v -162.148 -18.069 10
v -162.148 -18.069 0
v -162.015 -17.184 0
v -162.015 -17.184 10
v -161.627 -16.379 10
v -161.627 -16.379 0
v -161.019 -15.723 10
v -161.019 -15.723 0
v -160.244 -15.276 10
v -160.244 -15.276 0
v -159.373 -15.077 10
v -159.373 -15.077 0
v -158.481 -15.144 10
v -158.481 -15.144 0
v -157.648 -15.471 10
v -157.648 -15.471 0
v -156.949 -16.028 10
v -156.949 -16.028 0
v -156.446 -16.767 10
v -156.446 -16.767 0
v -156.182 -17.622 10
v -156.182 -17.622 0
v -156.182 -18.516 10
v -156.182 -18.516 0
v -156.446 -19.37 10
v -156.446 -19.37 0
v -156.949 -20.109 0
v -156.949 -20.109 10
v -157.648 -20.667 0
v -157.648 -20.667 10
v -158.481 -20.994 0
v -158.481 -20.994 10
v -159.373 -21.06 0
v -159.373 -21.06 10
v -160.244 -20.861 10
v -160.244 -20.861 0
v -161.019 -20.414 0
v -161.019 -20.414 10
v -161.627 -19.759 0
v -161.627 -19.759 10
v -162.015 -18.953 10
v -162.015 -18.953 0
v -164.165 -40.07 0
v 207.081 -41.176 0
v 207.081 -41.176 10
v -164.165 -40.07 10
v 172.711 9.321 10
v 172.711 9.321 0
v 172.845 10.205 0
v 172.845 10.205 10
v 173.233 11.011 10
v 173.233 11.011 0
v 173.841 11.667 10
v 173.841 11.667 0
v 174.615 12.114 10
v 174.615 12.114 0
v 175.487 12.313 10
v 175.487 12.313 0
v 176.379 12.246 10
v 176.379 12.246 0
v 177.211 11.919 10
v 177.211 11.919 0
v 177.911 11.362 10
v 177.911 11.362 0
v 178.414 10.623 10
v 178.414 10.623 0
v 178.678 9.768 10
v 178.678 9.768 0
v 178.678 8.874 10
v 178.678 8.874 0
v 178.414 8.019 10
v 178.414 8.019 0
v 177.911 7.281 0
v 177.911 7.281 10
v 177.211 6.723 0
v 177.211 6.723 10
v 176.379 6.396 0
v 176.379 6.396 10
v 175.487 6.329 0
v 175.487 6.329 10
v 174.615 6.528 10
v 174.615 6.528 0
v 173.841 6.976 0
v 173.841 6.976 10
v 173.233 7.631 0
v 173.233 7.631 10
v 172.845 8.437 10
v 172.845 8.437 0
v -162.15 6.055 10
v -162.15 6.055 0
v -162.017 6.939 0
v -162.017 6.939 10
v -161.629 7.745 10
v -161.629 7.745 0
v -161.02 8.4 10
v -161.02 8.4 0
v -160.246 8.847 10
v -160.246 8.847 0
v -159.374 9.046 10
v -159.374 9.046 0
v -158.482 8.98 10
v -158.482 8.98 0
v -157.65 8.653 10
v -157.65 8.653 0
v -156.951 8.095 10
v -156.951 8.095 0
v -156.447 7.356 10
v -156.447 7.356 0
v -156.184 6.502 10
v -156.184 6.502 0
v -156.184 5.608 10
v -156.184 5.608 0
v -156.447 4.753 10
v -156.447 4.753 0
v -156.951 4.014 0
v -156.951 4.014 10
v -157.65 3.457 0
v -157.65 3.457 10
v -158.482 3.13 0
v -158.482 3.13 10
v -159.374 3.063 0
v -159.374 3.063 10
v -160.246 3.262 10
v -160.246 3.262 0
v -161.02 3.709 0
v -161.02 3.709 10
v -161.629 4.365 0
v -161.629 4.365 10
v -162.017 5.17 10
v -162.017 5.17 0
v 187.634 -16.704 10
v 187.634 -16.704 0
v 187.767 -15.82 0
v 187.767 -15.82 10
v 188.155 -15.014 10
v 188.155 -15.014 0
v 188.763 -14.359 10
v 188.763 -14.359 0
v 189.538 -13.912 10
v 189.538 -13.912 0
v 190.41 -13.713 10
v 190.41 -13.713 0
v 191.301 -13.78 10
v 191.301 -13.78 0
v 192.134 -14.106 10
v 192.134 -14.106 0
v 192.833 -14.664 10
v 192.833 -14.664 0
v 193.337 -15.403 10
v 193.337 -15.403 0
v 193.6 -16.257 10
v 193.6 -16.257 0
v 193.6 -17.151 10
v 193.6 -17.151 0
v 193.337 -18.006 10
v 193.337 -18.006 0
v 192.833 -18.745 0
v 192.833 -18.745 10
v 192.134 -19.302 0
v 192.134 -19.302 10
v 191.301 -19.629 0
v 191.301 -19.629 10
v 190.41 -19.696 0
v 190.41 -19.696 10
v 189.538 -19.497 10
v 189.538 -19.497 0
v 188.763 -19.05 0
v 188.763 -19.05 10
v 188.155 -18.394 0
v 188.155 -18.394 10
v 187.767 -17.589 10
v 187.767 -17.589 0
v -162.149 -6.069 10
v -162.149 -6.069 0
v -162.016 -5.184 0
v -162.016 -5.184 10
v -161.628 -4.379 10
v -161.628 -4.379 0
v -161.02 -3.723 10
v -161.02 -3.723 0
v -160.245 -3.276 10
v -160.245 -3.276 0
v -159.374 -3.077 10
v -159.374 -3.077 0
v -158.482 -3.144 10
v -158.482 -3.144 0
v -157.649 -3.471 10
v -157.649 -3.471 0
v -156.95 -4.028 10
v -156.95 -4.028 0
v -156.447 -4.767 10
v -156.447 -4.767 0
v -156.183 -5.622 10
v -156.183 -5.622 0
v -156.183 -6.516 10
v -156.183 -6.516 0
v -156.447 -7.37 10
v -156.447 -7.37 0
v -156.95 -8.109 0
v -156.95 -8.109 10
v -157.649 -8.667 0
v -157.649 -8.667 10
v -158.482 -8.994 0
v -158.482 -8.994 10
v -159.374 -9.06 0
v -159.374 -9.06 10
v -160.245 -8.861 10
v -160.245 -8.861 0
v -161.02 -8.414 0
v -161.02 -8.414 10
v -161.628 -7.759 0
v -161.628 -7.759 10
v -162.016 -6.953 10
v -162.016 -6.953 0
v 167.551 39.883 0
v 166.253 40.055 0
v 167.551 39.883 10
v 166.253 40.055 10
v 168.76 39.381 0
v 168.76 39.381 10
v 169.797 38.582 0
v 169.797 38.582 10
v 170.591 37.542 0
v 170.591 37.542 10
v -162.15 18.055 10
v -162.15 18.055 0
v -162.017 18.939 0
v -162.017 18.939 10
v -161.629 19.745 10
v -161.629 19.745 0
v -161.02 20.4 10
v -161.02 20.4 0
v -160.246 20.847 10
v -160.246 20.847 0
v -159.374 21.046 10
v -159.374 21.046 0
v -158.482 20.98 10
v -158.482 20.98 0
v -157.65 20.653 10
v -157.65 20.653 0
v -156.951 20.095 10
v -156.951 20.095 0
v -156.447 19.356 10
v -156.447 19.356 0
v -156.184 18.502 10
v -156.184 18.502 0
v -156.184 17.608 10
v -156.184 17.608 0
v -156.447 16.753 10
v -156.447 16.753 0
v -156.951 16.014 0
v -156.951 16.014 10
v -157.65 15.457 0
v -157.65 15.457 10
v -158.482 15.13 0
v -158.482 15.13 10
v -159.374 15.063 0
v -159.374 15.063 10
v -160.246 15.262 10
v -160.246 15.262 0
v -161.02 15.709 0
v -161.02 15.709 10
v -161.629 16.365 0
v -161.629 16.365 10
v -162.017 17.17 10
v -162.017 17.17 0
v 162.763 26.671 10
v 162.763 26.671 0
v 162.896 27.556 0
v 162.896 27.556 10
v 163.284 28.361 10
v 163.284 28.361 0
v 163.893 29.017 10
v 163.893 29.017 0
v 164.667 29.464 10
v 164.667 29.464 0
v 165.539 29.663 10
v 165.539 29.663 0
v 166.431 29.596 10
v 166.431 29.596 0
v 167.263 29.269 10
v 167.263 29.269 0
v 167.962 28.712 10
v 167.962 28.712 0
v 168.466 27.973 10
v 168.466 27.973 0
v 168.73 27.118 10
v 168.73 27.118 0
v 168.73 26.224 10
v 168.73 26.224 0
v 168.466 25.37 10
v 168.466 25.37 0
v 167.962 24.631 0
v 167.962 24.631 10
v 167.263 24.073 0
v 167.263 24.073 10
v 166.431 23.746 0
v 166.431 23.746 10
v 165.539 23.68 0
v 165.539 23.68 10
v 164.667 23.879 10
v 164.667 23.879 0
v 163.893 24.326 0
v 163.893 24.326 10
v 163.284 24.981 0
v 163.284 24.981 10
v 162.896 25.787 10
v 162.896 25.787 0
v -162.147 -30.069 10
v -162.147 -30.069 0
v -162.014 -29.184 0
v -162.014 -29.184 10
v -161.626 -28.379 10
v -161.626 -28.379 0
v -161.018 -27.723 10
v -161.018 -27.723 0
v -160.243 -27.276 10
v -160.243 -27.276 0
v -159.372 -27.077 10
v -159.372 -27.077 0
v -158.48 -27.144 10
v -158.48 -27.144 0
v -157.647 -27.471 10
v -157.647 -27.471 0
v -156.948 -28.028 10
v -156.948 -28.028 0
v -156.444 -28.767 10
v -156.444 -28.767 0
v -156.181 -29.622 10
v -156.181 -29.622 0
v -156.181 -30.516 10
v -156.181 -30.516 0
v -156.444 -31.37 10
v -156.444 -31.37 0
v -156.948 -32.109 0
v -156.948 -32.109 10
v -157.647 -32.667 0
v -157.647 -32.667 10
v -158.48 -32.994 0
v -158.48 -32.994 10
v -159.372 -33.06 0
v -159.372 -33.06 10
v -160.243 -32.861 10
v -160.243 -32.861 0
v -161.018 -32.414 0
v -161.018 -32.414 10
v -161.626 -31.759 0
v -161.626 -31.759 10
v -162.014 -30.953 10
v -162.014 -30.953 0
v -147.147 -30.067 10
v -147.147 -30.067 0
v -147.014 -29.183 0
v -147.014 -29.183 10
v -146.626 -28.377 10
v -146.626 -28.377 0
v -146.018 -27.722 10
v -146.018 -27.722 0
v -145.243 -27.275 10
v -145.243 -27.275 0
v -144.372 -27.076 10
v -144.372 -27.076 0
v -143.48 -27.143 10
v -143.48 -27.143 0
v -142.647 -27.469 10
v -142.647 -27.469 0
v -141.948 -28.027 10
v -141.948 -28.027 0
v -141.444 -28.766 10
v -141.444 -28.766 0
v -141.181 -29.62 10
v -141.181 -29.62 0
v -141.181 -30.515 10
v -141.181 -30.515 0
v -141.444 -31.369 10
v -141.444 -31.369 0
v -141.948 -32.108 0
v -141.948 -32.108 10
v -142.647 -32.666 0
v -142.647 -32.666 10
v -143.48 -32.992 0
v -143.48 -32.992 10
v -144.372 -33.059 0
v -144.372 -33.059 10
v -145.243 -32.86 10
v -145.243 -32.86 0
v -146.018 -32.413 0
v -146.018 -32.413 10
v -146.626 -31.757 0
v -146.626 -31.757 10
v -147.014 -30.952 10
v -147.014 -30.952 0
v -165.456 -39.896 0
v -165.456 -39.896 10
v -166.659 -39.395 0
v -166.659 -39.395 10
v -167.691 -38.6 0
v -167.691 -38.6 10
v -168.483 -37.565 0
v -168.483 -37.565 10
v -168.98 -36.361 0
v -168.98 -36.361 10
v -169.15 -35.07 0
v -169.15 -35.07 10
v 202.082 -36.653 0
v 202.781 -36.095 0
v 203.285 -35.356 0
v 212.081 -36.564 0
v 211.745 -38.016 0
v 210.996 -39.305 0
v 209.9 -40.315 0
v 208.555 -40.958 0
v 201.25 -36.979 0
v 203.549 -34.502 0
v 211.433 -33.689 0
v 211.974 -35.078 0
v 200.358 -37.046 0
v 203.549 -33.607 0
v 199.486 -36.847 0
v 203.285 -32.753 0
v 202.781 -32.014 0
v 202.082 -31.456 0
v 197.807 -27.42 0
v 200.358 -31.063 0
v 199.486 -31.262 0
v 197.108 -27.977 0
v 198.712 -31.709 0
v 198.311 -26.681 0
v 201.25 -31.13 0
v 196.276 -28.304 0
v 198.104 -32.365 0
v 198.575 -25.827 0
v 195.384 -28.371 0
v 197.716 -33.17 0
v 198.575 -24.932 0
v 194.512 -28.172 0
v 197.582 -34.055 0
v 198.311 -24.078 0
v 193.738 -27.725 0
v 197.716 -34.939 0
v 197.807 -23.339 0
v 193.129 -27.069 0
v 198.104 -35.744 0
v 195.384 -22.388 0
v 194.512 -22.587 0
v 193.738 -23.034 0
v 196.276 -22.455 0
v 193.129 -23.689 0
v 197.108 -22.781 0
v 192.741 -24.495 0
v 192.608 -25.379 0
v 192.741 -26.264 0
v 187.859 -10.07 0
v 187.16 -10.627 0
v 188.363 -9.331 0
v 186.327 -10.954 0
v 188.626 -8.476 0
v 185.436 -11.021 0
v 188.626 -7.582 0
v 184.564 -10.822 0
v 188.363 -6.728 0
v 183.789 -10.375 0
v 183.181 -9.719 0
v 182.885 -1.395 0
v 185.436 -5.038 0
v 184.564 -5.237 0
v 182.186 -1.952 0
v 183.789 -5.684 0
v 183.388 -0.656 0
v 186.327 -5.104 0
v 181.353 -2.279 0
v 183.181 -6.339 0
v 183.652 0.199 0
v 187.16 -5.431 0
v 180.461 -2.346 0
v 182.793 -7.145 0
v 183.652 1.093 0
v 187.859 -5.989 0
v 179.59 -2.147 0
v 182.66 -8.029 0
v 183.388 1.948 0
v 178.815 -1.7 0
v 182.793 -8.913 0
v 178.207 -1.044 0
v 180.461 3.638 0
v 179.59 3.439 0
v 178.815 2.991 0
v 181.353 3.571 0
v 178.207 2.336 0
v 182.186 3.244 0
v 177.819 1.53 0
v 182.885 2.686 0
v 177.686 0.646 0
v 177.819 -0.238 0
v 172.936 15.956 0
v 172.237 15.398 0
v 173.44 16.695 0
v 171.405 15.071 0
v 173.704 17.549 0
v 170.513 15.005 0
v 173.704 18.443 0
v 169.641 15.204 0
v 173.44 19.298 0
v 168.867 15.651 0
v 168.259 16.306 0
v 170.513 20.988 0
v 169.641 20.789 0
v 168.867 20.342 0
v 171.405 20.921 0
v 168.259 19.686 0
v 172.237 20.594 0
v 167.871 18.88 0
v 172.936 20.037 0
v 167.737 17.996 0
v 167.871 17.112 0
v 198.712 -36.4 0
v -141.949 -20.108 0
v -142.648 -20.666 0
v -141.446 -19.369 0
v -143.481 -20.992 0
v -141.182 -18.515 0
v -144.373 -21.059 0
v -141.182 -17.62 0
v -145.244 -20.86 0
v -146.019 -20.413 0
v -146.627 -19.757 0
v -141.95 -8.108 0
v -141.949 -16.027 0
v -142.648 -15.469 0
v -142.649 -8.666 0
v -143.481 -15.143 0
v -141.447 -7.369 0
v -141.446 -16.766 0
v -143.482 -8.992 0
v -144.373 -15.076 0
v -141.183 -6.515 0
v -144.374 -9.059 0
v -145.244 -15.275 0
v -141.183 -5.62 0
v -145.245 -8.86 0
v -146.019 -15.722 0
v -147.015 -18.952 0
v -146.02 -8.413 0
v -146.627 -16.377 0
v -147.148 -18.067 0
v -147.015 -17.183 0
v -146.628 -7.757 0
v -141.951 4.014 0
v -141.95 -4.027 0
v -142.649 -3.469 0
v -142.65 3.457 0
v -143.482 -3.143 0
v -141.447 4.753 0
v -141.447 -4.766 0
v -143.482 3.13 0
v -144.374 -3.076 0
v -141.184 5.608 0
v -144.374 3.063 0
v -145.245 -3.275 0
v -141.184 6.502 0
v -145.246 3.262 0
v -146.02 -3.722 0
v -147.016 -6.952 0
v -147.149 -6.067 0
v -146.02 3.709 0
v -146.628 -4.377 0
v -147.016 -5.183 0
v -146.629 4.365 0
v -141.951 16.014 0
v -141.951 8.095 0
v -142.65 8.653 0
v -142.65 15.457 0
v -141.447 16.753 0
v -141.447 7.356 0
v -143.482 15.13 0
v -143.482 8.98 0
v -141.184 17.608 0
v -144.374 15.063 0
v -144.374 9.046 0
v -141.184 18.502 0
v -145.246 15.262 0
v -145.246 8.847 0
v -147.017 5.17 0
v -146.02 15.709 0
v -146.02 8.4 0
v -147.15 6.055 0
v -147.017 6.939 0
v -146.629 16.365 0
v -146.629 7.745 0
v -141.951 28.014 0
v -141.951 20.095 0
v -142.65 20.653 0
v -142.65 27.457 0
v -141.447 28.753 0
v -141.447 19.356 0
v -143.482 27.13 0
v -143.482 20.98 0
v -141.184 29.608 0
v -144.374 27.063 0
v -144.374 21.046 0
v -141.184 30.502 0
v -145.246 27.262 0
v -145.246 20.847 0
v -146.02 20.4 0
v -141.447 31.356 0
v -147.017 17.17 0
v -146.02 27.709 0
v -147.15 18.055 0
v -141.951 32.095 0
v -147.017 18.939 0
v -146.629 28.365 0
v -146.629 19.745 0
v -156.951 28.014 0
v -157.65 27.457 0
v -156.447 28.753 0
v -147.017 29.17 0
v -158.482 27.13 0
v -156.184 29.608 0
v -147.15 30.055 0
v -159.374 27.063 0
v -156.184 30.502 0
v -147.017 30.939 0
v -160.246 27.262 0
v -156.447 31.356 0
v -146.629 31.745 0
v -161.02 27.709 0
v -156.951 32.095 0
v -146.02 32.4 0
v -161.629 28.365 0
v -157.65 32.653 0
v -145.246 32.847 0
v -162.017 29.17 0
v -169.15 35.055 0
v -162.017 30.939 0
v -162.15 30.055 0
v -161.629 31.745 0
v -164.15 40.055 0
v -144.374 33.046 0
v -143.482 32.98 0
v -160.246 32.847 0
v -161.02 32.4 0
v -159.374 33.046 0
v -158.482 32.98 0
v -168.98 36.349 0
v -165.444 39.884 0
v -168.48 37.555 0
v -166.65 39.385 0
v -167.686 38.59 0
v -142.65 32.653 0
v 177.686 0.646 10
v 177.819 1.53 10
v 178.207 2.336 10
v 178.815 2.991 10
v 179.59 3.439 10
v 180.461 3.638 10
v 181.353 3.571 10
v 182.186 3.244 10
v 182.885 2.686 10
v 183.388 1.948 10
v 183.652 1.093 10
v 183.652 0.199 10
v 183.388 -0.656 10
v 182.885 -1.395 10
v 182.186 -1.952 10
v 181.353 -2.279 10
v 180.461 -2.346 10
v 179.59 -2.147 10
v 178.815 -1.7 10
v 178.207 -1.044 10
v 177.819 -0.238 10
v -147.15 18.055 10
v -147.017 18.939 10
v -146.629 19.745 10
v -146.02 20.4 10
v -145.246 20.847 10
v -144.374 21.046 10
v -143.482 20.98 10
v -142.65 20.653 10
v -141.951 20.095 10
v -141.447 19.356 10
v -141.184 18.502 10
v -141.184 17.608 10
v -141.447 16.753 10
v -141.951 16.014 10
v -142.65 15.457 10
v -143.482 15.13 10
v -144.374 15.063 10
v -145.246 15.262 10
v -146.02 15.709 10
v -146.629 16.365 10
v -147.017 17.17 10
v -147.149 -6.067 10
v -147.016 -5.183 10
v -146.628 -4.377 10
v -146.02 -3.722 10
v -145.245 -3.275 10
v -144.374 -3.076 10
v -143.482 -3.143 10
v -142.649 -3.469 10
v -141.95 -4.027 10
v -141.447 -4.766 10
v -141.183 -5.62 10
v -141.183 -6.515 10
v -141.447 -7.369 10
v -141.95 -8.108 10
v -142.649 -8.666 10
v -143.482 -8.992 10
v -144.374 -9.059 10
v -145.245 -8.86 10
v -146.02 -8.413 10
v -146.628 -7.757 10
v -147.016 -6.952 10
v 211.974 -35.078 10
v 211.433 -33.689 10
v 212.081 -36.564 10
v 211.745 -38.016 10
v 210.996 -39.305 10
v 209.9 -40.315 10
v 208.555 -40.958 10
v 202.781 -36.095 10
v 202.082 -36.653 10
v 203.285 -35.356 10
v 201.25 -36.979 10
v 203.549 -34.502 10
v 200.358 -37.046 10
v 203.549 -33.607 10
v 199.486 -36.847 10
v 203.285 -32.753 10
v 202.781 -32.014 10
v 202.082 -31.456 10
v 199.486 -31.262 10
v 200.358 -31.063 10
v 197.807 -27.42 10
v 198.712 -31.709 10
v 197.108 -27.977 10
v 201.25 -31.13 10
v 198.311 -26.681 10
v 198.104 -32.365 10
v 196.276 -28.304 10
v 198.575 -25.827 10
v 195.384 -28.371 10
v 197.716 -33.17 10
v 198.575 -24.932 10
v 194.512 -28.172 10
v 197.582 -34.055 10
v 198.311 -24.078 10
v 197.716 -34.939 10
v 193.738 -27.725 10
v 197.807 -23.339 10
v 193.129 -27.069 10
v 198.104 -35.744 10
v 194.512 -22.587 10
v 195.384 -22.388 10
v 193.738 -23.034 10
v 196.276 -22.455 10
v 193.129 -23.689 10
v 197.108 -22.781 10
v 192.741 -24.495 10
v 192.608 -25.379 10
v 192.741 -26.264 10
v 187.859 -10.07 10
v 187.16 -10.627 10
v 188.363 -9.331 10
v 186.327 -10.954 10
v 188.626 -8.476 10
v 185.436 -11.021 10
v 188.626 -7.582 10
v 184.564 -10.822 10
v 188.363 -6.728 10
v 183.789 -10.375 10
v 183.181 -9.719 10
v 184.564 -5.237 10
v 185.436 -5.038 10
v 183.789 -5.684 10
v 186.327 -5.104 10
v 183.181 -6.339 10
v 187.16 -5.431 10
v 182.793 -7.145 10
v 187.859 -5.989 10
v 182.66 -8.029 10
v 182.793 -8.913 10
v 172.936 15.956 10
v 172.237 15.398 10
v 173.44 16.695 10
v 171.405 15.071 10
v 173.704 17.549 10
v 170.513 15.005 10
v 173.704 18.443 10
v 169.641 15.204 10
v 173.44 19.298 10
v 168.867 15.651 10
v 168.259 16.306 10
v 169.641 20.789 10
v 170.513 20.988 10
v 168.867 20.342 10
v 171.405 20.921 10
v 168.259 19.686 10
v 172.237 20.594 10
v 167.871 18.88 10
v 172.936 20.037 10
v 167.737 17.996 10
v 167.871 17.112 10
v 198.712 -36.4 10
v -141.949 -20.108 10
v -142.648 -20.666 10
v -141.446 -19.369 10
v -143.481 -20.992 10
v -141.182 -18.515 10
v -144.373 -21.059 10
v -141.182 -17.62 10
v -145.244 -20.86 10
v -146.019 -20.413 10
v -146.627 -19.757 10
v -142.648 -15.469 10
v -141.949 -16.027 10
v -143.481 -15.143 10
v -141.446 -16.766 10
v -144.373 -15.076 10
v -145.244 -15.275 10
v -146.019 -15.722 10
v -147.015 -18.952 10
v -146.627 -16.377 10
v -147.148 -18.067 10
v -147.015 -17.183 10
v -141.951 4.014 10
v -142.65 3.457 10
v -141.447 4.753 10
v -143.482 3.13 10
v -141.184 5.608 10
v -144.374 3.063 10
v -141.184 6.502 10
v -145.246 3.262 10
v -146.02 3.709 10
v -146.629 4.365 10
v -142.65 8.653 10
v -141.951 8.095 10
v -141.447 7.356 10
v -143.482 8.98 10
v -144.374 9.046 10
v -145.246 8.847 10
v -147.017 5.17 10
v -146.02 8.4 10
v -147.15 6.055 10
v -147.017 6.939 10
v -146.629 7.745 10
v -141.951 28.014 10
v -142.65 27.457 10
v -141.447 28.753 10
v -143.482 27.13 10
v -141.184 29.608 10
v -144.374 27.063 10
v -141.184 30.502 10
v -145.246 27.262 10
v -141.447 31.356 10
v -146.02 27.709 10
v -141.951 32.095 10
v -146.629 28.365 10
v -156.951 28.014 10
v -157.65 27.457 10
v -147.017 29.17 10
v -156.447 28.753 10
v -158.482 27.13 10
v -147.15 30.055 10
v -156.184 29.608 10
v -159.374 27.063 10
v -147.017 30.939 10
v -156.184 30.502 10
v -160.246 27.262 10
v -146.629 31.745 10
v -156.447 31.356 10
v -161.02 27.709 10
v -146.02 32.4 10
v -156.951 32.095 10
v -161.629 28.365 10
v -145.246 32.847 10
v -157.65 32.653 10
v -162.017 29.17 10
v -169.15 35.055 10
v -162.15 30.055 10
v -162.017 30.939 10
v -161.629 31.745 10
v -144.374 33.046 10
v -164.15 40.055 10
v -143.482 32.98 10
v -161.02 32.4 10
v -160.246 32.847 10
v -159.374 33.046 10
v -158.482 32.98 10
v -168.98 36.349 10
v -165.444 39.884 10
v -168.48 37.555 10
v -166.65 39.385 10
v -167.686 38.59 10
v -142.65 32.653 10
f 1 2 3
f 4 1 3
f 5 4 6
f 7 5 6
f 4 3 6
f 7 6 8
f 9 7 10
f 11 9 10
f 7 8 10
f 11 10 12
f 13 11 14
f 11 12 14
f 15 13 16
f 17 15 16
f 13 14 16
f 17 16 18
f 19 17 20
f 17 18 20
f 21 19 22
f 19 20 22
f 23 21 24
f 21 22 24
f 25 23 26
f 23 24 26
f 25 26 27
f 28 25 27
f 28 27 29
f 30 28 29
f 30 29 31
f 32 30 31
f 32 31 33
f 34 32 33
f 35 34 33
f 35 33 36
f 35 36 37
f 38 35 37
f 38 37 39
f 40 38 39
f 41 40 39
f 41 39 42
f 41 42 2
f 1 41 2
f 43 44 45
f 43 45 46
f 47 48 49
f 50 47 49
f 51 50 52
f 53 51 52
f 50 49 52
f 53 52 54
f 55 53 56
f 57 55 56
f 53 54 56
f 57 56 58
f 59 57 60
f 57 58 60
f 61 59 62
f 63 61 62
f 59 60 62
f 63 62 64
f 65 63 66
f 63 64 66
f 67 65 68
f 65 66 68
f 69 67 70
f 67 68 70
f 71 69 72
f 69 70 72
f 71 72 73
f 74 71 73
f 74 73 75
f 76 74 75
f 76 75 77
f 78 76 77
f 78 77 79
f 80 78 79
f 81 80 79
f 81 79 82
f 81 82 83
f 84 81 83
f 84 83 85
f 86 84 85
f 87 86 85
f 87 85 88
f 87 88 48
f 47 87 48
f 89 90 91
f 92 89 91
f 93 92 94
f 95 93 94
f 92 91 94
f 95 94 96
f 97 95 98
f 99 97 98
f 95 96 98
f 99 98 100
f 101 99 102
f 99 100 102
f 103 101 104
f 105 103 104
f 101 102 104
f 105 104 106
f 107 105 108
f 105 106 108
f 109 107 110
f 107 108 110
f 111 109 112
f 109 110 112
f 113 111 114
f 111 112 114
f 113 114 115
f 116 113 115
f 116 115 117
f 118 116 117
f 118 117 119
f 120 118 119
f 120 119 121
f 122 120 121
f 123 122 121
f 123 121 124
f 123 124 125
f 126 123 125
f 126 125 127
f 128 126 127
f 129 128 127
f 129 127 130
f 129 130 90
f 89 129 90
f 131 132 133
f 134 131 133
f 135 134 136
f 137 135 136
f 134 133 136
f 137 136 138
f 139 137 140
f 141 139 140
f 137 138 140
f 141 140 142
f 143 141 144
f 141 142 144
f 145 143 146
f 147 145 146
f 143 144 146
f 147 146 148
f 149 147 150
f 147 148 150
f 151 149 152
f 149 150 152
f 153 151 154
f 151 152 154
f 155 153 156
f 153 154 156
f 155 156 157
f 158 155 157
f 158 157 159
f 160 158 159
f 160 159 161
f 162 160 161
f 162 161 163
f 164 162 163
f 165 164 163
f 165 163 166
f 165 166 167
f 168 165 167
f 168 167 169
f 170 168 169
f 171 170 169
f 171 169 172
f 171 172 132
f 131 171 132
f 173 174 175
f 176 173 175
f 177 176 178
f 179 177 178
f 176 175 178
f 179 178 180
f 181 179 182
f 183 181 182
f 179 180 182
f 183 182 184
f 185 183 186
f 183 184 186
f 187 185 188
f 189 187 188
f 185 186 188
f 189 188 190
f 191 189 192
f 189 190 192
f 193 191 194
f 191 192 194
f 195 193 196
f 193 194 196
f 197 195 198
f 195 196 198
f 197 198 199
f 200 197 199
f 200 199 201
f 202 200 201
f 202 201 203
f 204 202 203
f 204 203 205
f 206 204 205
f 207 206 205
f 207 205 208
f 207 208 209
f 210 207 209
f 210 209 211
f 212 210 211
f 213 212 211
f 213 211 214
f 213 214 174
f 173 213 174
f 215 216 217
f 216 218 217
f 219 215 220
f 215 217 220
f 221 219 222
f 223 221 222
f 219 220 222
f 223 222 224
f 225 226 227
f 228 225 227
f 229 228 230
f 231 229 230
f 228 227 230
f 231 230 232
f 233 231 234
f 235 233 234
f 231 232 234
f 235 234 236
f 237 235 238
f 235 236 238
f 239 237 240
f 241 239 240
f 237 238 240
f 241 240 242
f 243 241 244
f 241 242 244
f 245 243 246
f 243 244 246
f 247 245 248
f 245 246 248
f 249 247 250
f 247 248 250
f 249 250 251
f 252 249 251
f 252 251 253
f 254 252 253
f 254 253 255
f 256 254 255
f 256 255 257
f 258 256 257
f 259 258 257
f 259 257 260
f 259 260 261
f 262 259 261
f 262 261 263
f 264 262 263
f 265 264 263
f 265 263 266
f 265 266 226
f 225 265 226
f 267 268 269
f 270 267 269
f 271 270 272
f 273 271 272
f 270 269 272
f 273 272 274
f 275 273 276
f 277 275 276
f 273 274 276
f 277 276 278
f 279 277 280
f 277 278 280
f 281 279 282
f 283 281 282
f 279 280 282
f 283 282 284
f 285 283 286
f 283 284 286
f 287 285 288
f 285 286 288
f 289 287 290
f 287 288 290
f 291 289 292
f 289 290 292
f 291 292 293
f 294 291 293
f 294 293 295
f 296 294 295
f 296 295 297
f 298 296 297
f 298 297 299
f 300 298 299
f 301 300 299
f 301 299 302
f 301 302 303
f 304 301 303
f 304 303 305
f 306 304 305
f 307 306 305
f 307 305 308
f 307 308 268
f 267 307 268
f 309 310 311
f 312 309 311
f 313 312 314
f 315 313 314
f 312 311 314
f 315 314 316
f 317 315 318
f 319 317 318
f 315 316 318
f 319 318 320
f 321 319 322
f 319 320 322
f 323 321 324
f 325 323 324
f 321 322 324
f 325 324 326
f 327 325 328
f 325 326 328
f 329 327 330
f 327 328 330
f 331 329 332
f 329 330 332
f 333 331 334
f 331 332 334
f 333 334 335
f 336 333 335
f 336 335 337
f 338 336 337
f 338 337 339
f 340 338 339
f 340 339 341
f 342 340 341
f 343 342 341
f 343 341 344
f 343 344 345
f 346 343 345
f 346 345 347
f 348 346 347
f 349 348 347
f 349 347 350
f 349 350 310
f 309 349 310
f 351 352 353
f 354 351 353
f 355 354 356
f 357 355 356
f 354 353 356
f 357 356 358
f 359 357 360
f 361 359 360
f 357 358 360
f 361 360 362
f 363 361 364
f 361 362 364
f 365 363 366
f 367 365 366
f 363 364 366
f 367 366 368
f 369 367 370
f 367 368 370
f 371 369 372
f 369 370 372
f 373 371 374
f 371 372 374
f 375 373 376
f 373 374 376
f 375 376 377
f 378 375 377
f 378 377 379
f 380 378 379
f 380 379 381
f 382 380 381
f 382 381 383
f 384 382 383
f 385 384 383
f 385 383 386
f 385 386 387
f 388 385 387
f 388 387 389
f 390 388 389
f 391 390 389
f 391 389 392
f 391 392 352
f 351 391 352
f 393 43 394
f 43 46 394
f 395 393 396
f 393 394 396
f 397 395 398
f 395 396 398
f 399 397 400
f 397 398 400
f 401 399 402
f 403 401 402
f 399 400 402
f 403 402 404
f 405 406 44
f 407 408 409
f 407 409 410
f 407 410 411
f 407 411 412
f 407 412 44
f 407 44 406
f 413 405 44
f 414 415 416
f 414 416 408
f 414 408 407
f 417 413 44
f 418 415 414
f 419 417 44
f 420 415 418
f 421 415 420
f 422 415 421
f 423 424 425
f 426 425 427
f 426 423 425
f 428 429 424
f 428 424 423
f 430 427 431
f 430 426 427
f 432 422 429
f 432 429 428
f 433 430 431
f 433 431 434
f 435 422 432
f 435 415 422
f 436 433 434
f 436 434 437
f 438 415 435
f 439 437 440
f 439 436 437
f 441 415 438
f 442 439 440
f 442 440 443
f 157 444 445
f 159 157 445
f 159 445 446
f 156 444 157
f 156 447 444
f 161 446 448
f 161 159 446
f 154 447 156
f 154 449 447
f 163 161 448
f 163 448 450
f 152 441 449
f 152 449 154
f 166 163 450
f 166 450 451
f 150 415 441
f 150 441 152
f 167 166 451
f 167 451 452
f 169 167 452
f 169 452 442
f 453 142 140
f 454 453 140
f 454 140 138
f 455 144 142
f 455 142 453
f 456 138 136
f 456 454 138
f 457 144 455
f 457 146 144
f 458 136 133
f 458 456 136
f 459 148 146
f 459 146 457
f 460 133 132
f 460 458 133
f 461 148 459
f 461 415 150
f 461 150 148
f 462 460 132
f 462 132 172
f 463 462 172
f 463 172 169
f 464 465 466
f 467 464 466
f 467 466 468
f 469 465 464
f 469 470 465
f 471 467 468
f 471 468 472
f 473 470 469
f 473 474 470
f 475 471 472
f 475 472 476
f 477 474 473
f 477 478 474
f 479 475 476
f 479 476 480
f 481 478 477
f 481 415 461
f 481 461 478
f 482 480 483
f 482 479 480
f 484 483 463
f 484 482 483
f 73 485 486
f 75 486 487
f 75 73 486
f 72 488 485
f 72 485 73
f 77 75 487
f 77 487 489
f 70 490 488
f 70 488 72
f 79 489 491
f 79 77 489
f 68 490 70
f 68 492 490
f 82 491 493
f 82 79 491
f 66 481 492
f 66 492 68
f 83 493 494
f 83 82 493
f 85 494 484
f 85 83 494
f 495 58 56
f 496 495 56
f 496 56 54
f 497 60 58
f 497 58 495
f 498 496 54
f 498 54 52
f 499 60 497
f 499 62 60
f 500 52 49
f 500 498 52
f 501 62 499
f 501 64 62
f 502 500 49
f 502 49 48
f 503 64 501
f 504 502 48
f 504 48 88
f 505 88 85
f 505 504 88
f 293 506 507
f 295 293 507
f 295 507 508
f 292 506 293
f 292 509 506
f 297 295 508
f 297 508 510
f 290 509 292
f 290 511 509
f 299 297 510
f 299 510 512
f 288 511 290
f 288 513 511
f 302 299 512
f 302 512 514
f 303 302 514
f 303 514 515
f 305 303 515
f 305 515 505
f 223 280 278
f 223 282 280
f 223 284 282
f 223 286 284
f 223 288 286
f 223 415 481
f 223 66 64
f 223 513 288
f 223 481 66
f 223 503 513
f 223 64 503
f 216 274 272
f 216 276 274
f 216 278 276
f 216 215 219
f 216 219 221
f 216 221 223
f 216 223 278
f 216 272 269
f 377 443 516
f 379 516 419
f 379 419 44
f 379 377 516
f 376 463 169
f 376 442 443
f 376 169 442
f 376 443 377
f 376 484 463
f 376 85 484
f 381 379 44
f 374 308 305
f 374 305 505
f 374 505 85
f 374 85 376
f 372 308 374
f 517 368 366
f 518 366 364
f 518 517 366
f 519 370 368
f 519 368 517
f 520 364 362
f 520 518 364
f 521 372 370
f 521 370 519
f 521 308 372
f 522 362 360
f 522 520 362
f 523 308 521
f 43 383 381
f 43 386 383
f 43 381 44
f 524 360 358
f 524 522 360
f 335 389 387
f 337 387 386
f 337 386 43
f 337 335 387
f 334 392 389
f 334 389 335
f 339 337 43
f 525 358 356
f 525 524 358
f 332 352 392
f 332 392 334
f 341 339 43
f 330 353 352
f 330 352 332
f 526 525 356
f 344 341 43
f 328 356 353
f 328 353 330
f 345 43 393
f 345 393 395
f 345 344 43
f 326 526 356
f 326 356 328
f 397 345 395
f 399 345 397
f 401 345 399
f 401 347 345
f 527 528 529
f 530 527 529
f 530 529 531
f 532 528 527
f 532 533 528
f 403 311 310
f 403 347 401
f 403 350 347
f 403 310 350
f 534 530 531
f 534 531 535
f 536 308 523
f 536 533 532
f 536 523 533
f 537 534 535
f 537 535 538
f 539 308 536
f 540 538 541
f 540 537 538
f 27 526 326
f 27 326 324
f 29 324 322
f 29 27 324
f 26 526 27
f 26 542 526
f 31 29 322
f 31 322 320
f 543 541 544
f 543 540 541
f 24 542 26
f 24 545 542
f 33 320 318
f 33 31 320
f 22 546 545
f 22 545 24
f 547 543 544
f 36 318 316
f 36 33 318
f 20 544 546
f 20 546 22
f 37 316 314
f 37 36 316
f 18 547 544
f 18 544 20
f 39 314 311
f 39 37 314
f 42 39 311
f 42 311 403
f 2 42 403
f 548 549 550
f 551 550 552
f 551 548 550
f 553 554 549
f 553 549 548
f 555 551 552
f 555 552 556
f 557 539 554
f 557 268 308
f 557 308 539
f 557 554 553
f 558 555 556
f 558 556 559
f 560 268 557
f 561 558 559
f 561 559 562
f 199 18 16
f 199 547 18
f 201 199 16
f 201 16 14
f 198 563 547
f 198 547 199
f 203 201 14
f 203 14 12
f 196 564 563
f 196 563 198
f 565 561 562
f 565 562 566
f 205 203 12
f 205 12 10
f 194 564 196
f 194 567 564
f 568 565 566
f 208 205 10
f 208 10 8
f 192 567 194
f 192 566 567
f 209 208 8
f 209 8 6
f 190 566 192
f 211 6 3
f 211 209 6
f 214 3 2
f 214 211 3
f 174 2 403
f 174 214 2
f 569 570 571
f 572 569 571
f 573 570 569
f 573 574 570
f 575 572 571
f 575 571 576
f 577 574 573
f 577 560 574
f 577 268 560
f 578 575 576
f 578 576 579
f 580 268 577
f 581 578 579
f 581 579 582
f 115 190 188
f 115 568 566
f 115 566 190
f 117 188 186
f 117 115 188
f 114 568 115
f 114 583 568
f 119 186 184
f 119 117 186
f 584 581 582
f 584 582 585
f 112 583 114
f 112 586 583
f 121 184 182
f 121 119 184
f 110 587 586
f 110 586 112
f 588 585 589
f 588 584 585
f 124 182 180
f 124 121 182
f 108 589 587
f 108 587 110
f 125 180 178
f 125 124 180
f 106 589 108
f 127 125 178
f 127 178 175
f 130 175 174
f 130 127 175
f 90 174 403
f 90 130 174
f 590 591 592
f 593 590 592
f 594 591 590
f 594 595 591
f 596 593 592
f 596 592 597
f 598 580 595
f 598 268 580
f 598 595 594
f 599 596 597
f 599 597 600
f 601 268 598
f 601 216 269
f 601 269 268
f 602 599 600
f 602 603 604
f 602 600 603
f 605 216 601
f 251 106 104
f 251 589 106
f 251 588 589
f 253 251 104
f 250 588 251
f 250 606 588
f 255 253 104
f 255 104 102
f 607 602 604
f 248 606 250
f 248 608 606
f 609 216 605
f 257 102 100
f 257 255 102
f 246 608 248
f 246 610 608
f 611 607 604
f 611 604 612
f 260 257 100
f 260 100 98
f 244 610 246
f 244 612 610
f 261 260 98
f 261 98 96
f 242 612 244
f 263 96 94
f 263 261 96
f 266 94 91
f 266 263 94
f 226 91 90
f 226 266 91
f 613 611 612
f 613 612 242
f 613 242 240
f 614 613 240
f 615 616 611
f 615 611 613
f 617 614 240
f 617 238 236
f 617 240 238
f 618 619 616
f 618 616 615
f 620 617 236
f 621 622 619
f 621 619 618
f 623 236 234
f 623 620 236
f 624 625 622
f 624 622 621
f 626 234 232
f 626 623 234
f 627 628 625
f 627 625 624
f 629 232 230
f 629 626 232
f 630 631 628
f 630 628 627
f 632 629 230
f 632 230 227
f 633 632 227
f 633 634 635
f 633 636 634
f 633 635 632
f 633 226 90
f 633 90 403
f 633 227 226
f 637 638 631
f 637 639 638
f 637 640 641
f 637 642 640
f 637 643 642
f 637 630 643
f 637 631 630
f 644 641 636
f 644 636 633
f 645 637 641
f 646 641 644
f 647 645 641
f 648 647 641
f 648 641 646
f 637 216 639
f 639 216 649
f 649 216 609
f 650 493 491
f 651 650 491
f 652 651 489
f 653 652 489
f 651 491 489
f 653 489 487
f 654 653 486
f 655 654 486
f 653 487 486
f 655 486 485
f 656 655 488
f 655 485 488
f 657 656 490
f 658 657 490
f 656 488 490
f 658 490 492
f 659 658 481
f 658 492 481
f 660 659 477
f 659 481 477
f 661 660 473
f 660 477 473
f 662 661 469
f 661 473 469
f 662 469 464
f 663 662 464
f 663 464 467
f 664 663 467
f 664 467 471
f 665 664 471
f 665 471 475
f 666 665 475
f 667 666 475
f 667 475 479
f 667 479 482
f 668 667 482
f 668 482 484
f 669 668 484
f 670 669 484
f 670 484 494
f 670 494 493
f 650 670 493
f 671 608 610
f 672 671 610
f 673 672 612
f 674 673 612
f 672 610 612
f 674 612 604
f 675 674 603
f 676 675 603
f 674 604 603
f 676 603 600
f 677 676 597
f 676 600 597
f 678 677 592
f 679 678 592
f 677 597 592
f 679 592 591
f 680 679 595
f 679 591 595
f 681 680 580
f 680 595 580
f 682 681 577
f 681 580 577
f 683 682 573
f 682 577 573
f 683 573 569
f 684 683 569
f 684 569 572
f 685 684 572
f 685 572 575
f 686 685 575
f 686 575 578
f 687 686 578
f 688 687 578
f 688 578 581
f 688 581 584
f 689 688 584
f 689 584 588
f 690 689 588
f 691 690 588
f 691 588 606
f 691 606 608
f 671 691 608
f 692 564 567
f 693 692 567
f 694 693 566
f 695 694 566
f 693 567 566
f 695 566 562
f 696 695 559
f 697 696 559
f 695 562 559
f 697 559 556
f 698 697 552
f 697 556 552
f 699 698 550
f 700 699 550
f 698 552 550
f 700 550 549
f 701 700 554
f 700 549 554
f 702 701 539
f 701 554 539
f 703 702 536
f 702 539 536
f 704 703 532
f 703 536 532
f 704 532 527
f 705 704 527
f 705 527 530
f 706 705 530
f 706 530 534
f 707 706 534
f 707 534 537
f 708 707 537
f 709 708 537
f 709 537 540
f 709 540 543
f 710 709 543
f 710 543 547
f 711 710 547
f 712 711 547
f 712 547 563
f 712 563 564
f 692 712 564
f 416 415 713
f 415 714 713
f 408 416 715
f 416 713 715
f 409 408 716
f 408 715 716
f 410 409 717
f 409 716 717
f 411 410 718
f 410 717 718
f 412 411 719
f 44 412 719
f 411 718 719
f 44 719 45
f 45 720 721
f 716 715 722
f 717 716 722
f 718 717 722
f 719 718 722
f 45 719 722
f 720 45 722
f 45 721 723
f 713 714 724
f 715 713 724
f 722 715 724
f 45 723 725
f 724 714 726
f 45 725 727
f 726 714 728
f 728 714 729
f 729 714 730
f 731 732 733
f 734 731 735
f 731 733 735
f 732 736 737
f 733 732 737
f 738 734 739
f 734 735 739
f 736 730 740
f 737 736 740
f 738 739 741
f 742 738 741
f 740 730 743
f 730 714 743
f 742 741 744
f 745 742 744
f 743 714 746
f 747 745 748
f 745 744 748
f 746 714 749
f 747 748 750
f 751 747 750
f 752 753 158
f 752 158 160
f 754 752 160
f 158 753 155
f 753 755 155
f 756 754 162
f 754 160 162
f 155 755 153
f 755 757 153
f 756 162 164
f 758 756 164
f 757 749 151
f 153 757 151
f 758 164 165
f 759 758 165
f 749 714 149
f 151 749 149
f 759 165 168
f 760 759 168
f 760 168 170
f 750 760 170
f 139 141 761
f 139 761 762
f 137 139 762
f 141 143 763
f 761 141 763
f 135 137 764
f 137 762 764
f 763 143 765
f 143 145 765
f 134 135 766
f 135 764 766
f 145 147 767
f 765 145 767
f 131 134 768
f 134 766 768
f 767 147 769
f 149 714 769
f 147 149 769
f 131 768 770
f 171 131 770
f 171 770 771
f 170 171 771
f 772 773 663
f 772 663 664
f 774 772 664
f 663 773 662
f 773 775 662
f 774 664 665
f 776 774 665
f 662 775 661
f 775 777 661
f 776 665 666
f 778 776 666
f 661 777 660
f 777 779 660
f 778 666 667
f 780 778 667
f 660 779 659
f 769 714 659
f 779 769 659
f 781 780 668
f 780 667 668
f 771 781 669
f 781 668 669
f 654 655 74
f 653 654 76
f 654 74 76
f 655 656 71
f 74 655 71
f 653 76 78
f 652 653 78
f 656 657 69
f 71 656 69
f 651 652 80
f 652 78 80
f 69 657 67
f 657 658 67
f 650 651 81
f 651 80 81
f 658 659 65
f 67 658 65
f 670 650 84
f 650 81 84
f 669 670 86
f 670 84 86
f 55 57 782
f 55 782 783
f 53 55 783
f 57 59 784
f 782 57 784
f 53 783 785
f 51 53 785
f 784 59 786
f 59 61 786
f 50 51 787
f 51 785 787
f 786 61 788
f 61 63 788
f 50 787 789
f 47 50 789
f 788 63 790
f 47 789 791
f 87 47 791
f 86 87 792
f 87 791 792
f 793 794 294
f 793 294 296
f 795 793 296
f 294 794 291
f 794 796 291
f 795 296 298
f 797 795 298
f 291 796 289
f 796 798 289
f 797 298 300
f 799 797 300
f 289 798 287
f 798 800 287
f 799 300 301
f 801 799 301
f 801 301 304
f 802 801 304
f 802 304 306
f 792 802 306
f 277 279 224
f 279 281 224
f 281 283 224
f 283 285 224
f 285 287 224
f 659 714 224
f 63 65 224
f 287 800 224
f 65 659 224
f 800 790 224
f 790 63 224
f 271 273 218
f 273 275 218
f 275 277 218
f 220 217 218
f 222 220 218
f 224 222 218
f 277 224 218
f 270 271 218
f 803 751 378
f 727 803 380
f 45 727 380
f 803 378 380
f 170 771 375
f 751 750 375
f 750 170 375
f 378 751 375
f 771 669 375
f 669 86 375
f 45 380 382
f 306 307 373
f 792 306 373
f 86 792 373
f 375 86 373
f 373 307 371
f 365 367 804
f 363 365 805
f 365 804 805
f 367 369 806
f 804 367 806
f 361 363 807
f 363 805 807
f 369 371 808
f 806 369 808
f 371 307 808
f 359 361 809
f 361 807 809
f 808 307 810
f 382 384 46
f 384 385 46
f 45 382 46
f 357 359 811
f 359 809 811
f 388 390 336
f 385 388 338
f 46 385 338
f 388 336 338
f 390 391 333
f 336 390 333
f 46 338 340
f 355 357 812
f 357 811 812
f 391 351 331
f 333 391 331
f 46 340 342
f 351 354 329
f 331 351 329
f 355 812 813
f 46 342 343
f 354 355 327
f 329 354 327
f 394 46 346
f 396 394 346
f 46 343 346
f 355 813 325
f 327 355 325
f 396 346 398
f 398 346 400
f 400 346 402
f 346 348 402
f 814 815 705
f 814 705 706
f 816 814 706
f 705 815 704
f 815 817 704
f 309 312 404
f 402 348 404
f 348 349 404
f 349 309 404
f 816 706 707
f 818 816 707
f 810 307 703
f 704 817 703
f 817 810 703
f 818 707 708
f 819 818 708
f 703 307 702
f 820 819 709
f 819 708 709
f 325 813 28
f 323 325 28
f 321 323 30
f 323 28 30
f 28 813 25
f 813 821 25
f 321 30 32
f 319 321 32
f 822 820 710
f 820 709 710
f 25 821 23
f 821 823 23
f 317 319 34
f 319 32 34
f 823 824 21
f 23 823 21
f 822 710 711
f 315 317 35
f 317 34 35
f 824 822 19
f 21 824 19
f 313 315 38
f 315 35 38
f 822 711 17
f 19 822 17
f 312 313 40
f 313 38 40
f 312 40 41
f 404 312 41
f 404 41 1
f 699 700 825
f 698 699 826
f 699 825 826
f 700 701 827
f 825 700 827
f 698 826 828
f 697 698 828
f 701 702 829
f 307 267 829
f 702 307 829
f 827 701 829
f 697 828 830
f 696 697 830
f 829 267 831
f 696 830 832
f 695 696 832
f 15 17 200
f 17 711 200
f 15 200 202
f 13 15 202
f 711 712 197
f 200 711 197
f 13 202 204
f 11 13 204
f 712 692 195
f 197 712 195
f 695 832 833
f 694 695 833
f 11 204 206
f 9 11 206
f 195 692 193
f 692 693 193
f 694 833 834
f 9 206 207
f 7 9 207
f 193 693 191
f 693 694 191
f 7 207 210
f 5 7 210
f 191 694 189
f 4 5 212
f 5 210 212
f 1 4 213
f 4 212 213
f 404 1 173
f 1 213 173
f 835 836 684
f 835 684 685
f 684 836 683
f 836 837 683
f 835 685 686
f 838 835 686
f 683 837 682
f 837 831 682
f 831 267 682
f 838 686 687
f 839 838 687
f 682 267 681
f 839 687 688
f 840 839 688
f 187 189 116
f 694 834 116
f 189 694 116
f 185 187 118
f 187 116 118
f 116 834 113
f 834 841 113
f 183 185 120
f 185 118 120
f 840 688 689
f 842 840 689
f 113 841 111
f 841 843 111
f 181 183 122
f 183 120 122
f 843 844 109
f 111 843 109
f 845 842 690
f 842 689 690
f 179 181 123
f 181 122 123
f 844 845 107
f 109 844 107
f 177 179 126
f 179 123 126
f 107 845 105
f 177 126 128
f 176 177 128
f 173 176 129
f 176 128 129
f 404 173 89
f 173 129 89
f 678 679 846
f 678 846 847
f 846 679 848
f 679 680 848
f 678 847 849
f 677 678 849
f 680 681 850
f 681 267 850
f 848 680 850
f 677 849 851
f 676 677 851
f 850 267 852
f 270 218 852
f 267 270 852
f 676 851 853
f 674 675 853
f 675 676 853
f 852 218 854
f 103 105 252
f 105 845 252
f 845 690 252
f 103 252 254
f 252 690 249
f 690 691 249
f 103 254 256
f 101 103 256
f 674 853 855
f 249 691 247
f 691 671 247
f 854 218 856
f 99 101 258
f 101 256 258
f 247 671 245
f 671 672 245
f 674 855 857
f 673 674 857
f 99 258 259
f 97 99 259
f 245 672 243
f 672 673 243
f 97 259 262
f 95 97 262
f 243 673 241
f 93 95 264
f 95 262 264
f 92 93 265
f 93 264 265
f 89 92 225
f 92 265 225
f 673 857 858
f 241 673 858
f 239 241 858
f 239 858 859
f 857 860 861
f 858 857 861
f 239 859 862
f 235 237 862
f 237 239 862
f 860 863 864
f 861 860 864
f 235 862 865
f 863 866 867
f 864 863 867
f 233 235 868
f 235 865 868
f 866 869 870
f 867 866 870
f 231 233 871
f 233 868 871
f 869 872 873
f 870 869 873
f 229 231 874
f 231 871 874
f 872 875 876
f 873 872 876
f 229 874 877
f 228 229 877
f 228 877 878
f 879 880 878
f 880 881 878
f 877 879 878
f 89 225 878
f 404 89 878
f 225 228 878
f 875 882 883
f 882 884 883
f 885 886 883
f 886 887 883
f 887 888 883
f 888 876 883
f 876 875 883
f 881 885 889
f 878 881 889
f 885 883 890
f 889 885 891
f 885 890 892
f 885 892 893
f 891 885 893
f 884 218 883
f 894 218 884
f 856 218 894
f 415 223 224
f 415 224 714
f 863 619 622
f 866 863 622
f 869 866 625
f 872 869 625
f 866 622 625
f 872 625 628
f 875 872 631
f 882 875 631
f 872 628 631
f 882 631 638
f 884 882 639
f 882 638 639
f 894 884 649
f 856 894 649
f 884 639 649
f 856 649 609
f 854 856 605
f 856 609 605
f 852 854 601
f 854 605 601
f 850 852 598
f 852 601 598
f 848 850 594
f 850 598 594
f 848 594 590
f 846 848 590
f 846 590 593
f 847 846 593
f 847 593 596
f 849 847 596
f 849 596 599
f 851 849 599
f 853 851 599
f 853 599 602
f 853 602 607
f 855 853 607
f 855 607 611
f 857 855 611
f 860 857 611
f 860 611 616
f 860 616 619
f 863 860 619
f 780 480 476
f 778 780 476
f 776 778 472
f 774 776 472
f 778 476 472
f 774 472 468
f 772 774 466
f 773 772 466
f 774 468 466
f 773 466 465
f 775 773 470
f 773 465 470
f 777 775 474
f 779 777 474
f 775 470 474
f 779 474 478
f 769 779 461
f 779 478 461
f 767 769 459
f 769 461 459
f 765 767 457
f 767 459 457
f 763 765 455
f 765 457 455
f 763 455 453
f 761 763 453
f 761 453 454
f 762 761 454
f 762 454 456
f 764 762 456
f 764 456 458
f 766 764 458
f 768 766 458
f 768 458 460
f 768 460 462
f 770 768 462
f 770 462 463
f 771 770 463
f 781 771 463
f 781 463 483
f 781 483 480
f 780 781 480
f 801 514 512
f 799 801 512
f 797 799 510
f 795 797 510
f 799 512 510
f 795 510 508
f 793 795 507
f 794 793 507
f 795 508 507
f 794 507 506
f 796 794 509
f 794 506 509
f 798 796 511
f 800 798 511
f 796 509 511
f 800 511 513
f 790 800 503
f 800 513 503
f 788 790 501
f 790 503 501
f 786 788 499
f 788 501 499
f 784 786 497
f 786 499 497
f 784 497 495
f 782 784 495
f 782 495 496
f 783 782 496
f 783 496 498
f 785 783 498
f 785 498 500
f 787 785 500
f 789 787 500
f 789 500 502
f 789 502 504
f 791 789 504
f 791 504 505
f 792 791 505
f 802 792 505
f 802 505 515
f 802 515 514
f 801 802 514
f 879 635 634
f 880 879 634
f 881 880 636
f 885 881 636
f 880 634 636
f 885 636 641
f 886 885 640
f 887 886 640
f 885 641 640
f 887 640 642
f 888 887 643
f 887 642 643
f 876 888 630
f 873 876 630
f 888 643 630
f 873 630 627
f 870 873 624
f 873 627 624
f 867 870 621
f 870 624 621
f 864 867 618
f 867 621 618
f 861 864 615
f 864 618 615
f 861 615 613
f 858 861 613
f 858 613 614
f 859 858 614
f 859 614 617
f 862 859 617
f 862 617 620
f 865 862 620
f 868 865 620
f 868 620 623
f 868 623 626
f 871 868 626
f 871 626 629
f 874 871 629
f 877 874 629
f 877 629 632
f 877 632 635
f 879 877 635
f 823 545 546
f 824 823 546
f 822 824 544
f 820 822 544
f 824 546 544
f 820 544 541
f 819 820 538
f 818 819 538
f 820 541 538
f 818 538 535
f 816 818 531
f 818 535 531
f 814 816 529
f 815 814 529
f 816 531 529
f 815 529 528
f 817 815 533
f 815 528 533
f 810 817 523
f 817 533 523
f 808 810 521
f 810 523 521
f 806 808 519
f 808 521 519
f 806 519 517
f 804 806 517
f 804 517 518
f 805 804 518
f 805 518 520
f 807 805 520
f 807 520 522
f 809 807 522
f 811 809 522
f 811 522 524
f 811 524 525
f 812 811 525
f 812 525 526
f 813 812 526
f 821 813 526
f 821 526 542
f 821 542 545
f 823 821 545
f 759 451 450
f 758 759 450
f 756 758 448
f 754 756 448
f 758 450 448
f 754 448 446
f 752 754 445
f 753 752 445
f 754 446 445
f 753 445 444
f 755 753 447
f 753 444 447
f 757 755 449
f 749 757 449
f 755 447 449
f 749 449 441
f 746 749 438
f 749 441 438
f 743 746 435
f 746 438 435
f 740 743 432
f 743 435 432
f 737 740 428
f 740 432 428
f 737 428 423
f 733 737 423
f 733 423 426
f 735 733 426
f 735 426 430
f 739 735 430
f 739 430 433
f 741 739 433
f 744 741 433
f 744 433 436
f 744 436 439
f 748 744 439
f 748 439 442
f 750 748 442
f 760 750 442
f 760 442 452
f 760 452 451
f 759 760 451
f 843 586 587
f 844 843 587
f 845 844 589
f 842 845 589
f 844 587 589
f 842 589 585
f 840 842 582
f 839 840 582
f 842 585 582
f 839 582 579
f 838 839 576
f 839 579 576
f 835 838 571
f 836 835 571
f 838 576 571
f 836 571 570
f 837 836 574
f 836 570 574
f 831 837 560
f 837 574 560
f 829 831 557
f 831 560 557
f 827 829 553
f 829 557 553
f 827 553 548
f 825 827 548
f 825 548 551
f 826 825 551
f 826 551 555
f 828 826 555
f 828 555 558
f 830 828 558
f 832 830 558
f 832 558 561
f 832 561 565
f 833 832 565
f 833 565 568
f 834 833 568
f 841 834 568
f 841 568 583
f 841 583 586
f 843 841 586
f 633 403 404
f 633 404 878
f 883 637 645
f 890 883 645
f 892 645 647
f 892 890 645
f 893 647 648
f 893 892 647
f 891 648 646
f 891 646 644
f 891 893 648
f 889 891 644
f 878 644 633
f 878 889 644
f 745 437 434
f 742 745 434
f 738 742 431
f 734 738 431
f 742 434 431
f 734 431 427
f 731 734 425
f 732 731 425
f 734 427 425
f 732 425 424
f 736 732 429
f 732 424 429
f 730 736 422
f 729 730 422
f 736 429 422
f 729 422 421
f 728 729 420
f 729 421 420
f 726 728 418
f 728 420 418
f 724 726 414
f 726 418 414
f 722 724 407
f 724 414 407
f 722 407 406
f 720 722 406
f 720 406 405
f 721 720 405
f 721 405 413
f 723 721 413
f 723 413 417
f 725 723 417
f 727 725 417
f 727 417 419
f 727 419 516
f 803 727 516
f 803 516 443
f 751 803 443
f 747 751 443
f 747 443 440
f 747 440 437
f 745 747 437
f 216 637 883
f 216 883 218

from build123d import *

# Parameters (mm, degrees)
BOSS_EXTRUDE1_DEPTH = 10
FILLET1_R           = 5
SKETCH2_R           = 3
CUT_EXTRUDE1_DEPTH  = 15


with BuildPart() as part:
    # Sketch1 → Boss-Extrude1 (new body)
    with BuildSketch(Plane.XY):
        Polygon((-169.15, 40.054759159), (169.15, 40.054759159), (215.74113672, -41.201675672), (-169.15, -40.054759159), align=None)
    extrude(amount=BOSS_EXTRUDE1_DEPTH)

    # Fillet1
    fillet1_edges = [part.edges().sort_by_distance(p)[0] for p in [
        (-169.15, 40.054759159, 5),
        (169.15, 40.054759159, 5),
        (215.74113672, -41.201675672, 5),
        (-169.15, -40.054759159, 5),
    ]]
    fillet(fillet1_edges, radius=FILLET1_R)

    # Sketch2 → Cut-Extrude1 (cut)
    with BuildSketch(Plane(origin=(0, 0, 0), x_dir=(-1, 0, 0), z_dir=(0, 0, -1))):
        with Locations((144.15, 30.054759159)):
            Circle(SKETCH2_R)
        with Locations((159.15, 30.054759159)):
            Circle(SKETCH2_R)
        with Locations((159.15, 18.054759159)):
            Circle(SKETCH2_R)
        with Locations((159.15, 6.054759159)):
            Circle(SKETCH2_R)
        with Locations((144.15, 18.054759159)):
            Circle(SKETCH2_R)
        with Locations((144.15, 6.054759159)):
            Circle(SKETCH2_R)
        with Locations((144.149466916, -6.067437377)):
            Circle(SKETCH2_R)
        with Locations((144.148411495, -18.06743733)):
            Circle(SKETCH2_R)
        with Locations((159.149466858, -6.068756652)):
            Circle(SKETCH2_R)
        with Locations((159.148411437, -18.068756606)):
            Circle(SKETCH2_R)
        with Locations((159.147356017, -30.06875656)):
            Circle(SKETCH2_R)
        with Locations((144.147356075, -30.067437284)):
            Circle(SKETCH2_R)
        with Locations((-165.763069515, 26.671271591)):
            Circle(SKETCH2_R)
        with Locations((-195.608099644, -25.379416941)):
            Circle(SKETCH2_R)
        with Locations((-190.633927956, -16.704302185)):
            Circle(SKETCH2_R)
        with Locations((-185.659756267, -8.02918743)):
            Circle(SKETCH2_R)
        with Locations((-180.685584579, 0.645927325)):
            Circle(SKETCH2_R)
        with Locations((-175.711412891, 9.32104208)):
            Circle(SKETCH2_R)
        with Locations((-170.737241203, 17.996156836)):
            Circle(SKETCH2_R)
        with Locations((-200.582271332, -34.054531696)):
            Circle(SKETCH2_R)
    extrude(amount=-CUT_EXTRUDE1_DEPTH, mode=Mode.SUBTRACT)


solid = part.part
